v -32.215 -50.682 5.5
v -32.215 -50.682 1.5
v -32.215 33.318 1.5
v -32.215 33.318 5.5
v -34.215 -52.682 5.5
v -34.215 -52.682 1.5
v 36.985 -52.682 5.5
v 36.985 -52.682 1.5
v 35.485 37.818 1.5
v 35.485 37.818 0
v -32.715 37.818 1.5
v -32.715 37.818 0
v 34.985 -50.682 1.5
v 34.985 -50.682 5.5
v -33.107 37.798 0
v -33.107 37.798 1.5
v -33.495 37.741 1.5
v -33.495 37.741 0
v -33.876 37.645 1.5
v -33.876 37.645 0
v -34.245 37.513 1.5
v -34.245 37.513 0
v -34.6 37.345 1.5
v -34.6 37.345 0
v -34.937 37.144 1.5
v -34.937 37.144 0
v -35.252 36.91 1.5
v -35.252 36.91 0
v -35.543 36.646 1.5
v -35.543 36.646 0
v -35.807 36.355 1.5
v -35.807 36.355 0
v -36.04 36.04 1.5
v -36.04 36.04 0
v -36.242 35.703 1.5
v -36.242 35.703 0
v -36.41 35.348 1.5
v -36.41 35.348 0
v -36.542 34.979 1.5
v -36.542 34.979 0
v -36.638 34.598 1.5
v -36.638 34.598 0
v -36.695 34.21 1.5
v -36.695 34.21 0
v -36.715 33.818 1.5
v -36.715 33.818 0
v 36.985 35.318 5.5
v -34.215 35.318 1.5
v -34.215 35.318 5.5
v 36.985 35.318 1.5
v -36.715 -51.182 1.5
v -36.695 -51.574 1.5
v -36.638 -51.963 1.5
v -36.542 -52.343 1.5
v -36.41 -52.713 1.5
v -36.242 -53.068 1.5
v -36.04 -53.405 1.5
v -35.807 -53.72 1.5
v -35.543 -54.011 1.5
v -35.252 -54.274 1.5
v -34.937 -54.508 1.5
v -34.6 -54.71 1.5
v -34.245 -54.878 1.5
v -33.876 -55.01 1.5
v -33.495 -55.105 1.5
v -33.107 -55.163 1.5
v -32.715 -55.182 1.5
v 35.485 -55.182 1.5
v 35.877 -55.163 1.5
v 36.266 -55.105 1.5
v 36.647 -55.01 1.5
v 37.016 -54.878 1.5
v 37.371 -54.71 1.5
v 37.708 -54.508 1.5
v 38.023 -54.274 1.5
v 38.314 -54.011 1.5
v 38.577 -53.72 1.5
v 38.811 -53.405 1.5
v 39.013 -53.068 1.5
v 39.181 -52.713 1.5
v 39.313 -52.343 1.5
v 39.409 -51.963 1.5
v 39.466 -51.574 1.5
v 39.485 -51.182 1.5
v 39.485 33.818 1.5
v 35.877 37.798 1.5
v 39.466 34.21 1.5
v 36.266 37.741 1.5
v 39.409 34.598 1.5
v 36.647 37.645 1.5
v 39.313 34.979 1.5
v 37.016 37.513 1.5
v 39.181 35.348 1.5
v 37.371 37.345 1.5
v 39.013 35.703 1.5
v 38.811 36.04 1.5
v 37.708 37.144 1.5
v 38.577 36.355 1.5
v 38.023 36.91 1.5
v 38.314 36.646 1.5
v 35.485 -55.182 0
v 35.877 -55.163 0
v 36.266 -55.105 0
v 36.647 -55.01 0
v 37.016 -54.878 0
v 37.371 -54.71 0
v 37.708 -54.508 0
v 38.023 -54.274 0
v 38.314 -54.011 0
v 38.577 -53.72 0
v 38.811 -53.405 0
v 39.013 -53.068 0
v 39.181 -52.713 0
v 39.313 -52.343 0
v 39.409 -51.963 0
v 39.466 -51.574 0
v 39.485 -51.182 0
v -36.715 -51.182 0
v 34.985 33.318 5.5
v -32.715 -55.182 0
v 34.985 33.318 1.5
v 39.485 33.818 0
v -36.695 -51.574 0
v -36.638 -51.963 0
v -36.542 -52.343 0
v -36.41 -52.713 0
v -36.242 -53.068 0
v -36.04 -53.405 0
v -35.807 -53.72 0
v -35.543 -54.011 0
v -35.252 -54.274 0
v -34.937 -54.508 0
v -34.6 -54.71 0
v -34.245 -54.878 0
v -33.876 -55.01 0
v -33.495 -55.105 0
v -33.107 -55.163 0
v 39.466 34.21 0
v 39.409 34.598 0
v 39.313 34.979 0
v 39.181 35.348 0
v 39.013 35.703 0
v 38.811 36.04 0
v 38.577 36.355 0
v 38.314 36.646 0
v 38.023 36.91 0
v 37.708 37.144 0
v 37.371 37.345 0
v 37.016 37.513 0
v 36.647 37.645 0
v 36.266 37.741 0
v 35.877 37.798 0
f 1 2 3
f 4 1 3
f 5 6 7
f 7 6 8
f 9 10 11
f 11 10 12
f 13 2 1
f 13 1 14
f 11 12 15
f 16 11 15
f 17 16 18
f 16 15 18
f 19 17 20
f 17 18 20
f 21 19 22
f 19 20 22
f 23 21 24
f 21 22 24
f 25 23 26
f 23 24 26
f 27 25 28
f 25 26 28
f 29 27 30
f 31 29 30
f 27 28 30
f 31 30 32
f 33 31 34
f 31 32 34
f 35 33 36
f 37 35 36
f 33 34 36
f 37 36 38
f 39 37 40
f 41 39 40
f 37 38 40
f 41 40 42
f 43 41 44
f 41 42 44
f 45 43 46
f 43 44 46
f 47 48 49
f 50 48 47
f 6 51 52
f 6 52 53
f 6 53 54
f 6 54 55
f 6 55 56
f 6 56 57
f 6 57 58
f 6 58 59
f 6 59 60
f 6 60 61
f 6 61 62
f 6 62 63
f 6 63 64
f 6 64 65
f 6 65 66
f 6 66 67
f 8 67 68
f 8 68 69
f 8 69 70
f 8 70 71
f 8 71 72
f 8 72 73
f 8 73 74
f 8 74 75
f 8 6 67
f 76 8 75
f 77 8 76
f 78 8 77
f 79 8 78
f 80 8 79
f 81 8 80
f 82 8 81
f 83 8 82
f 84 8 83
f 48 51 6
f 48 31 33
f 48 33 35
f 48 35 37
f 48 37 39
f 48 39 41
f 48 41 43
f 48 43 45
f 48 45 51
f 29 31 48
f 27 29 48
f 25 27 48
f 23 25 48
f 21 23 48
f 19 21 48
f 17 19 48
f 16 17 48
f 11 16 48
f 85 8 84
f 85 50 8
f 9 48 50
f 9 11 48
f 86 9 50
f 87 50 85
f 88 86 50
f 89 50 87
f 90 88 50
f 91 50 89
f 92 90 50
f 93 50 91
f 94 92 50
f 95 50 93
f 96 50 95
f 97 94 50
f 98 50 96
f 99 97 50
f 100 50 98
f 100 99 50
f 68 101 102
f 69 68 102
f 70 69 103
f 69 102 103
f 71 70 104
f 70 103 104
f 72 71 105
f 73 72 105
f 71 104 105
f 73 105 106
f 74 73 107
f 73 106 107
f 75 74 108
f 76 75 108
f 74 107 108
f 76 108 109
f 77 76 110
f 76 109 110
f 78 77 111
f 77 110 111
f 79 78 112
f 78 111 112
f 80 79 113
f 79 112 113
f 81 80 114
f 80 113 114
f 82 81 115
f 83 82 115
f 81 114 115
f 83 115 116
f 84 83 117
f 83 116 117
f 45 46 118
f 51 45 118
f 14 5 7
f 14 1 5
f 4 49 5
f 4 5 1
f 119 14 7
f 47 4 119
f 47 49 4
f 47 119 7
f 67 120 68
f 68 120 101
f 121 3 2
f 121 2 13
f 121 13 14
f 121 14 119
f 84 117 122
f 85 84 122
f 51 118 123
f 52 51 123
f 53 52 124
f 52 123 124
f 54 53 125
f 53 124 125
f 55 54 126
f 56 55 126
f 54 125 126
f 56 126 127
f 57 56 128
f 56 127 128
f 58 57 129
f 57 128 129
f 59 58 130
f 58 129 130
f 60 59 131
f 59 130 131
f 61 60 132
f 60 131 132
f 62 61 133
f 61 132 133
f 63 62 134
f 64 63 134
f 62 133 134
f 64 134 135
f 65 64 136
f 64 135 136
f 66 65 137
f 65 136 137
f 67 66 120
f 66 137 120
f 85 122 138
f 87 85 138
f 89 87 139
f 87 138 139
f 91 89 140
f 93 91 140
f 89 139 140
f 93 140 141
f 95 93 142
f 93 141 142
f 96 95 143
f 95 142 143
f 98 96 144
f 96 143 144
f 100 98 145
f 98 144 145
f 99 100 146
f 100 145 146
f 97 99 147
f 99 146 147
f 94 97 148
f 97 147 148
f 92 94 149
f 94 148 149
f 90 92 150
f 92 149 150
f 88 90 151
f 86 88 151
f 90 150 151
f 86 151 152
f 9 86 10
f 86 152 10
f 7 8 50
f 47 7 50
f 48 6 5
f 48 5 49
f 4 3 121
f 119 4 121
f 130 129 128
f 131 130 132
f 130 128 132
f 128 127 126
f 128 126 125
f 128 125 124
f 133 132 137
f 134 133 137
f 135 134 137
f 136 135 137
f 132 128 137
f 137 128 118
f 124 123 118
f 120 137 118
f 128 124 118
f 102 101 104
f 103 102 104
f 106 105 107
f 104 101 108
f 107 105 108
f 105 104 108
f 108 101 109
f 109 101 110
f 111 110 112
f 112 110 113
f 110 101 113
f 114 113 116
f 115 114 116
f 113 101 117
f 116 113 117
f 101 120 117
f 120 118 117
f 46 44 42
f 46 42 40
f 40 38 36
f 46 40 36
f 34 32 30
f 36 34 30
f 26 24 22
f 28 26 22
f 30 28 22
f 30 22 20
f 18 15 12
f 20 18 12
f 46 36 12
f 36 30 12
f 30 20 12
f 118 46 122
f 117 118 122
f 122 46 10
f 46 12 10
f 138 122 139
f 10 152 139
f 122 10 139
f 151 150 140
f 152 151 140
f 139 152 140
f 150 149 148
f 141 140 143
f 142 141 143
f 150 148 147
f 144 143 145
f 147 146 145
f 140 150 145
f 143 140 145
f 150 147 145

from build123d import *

# Parameters (mm, degrees)
F0_W     = 71.2
F0_H     = 88
F1_DEPTH = 1.5
F2_W     = 71.2
F2_H     = 88
F2_W_2   = 67.2
F2_H_2   = 84
F3_DEPTH = 4


with BuildPart() as f1:
    # F0 (on Top) → F1 (new body)
    with BuildSketch(Plane.XY):
        with BuildLine():
            Line((35.4853983939, 37.8176547885), (-32.7146016061, 37.8176547885))
            ThreePointArc((-32.7146016061, 37.8176547885), (-35.5430287309, 36.6460819132), (-36.7146016061, 33.8176547885))
            Line((-36.7146016061, 33.8176547885), (-36.7146016061, -51.1823452115))
            ThreePointArc((-36.7146016061, -51.1823452115), (-35.5430287309, -54.0107723363), (-32.7146016061, -55.1823452115))
            Line((-32.7146016061, -55.1823452115), (35.4853983939, -55.1823452115))
            ThreePointArc((35.4853983939, -55.1823452115), (38.3138255186, -54.0107723363), (39.4853983939, -51.1823452115))
            Line((39.4853983939, -51.1823452115), (39.4853983939, 33.8176547885))
            ThreePointArc((39.4853983939, 33.8176547885), (38.3138255186, 36.6460819132), (35.4853983939, 37.8176547885))
        make_face()
        with Locations((1.3853983939, -8.6823452115)):
            Rectangle(F0_W, F0_H, mode=Mode.SUBTRACT)
        with Locations((1.3853983939, -8.6823452115)):
            Rectangle(F0_W, F0_H)
    extrude(amount=F1_DEPTH)

    # F2 (on face) → F3 (join)
    with BuildSketch(Plane.XY.offset(1.5)):
        with Locations((1.3853983939, -8.6823452115)):
            Rectangle(F2_W, F2_H)
        with Locations((1.3853983939, -8.6823452115)):
            Rectangle(F2_W_2, F2_H_2, mode=Mode.SUBTRACT)
    extrude(amount=F3_DEPTH)


solid = f1.part
